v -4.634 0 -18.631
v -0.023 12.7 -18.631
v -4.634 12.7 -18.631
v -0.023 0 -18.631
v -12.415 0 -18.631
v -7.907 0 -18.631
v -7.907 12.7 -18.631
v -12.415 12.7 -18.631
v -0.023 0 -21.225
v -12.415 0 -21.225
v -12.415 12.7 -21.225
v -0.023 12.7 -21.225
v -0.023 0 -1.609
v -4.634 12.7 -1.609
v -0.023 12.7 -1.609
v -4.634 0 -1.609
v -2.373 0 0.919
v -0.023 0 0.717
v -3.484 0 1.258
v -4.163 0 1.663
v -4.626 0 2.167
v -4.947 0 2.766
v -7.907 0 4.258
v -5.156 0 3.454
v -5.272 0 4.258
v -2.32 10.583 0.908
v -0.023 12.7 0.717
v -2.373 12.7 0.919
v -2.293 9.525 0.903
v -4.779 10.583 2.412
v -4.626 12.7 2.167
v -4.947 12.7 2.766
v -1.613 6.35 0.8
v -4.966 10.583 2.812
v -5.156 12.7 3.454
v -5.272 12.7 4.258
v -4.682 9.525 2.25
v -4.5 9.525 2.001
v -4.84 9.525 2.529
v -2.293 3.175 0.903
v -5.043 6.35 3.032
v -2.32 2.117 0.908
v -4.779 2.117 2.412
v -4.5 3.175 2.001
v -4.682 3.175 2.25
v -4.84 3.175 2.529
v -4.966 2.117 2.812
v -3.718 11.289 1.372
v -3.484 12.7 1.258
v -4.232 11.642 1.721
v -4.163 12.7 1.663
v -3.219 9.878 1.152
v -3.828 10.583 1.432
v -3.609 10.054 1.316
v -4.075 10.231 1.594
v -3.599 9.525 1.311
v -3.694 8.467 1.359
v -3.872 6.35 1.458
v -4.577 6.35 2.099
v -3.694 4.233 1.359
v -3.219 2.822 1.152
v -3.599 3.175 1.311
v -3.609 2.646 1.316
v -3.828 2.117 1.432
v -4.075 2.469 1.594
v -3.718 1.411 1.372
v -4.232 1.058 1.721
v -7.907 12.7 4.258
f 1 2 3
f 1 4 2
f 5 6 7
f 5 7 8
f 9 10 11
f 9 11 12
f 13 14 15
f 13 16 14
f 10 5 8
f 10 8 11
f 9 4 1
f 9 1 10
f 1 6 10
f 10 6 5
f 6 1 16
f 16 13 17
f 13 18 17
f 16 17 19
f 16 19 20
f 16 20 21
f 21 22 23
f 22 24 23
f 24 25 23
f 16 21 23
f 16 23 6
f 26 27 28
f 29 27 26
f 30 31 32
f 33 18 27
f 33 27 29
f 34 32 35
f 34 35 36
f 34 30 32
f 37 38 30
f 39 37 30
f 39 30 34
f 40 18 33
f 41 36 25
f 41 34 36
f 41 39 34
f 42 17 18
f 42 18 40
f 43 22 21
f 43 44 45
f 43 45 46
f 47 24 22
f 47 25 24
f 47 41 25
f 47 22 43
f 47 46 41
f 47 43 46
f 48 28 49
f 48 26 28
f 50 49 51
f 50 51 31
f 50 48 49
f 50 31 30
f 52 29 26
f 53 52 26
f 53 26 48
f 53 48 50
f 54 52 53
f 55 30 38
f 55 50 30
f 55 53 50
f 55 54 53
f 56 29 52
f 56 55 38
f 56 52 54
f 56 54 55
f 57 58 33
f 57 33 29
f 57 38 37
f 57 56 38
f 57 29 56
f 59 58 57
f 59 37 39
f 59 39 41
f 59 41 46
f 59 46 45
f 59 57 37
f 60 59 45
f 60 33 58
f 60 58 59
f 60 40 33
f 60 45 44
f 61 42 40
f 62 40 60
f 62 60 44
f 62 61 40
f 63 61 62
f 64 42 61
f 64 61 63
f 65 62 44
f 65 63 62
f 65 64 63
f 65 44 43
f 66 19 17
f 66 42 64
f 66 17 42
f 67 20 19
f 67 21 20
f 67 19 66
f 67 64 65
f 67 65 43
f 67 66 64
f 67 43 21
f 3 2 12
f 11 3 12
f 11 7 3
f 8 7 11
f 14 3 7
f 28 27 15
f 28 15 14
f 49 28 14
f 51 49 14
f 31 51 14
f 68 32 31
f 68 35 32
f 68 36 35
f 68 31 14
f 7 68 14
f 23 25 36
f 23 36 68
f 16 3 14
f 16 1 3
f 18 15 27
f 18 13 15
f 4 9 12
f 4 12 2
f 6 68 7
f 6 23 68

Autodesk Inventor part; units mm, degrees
ref_plane "YZ Plane" through (0, 0, 0) normal (1, 0, 0) x (0, 1, 0)
ref_plane "XZ Plane" through (0, 0, 0) normal (0, 1, 0) x (-1, 0, 0)
ref_plane "XY Plane" through (0, 0, 0) normal (0, 0, 1) x (1, 0, 0)
sketch "Sketch1" plane through (0, 0, 0) normal (0, 1, 0) x (-1, 0, 0)
  line L0 (-3.8257, 4.2576) -> (4.1137, 4.2576) construction
  line L1 (4.1137, 4.2576) -> (4.1137, -4.4222) construction
  line L2 (4.1137, -4.4222) -> (-3.8257, -4.4222) construction
  line L3 (-3.8257, -4.4222) -> (-3.8257, 4.2576) construction
  line L4 (12.4147, -21.2247) -> (0.0234, -21.2247)
  line L5 (0.0234, -21.2247) -> (0.0234, -18.6312)
  line L6 (0.0234, -18.6312) -> (4.6341, -18.6312)
  line L7 (4.6341, -18.6312) -> (4.6341, -1.6087)
  line L8 (4.6341, -1.6087) -> (0.0234, -1.6087)
  line L9 (0.0234, -1.6087) -> (0.0234, 0.7173)
  spline S0 degree 2 poles (0.0234, 0.7173) (2.6375, 0.7173) (5.1075, 2.1993) (5.2722, 4.2576) knots 0 0 0 1 2 2 2
  line L10 (5.2722, 4.2576) -> (7.9069, 4.2576)
  line L11 (7.9069, 4.2576) -> (7.9069, -18.6312)
  line L12 (7.9069, -18.6312) -> (12.4147, -18.6312)
  line L13 (12.4147, -18.6312) -> (12.4147, -21.2247)
  point P0 (0, 0)
extrude "Extrusion1" add sketch "Sketch1" along normal blind 12.7
properties part number "Text1"
